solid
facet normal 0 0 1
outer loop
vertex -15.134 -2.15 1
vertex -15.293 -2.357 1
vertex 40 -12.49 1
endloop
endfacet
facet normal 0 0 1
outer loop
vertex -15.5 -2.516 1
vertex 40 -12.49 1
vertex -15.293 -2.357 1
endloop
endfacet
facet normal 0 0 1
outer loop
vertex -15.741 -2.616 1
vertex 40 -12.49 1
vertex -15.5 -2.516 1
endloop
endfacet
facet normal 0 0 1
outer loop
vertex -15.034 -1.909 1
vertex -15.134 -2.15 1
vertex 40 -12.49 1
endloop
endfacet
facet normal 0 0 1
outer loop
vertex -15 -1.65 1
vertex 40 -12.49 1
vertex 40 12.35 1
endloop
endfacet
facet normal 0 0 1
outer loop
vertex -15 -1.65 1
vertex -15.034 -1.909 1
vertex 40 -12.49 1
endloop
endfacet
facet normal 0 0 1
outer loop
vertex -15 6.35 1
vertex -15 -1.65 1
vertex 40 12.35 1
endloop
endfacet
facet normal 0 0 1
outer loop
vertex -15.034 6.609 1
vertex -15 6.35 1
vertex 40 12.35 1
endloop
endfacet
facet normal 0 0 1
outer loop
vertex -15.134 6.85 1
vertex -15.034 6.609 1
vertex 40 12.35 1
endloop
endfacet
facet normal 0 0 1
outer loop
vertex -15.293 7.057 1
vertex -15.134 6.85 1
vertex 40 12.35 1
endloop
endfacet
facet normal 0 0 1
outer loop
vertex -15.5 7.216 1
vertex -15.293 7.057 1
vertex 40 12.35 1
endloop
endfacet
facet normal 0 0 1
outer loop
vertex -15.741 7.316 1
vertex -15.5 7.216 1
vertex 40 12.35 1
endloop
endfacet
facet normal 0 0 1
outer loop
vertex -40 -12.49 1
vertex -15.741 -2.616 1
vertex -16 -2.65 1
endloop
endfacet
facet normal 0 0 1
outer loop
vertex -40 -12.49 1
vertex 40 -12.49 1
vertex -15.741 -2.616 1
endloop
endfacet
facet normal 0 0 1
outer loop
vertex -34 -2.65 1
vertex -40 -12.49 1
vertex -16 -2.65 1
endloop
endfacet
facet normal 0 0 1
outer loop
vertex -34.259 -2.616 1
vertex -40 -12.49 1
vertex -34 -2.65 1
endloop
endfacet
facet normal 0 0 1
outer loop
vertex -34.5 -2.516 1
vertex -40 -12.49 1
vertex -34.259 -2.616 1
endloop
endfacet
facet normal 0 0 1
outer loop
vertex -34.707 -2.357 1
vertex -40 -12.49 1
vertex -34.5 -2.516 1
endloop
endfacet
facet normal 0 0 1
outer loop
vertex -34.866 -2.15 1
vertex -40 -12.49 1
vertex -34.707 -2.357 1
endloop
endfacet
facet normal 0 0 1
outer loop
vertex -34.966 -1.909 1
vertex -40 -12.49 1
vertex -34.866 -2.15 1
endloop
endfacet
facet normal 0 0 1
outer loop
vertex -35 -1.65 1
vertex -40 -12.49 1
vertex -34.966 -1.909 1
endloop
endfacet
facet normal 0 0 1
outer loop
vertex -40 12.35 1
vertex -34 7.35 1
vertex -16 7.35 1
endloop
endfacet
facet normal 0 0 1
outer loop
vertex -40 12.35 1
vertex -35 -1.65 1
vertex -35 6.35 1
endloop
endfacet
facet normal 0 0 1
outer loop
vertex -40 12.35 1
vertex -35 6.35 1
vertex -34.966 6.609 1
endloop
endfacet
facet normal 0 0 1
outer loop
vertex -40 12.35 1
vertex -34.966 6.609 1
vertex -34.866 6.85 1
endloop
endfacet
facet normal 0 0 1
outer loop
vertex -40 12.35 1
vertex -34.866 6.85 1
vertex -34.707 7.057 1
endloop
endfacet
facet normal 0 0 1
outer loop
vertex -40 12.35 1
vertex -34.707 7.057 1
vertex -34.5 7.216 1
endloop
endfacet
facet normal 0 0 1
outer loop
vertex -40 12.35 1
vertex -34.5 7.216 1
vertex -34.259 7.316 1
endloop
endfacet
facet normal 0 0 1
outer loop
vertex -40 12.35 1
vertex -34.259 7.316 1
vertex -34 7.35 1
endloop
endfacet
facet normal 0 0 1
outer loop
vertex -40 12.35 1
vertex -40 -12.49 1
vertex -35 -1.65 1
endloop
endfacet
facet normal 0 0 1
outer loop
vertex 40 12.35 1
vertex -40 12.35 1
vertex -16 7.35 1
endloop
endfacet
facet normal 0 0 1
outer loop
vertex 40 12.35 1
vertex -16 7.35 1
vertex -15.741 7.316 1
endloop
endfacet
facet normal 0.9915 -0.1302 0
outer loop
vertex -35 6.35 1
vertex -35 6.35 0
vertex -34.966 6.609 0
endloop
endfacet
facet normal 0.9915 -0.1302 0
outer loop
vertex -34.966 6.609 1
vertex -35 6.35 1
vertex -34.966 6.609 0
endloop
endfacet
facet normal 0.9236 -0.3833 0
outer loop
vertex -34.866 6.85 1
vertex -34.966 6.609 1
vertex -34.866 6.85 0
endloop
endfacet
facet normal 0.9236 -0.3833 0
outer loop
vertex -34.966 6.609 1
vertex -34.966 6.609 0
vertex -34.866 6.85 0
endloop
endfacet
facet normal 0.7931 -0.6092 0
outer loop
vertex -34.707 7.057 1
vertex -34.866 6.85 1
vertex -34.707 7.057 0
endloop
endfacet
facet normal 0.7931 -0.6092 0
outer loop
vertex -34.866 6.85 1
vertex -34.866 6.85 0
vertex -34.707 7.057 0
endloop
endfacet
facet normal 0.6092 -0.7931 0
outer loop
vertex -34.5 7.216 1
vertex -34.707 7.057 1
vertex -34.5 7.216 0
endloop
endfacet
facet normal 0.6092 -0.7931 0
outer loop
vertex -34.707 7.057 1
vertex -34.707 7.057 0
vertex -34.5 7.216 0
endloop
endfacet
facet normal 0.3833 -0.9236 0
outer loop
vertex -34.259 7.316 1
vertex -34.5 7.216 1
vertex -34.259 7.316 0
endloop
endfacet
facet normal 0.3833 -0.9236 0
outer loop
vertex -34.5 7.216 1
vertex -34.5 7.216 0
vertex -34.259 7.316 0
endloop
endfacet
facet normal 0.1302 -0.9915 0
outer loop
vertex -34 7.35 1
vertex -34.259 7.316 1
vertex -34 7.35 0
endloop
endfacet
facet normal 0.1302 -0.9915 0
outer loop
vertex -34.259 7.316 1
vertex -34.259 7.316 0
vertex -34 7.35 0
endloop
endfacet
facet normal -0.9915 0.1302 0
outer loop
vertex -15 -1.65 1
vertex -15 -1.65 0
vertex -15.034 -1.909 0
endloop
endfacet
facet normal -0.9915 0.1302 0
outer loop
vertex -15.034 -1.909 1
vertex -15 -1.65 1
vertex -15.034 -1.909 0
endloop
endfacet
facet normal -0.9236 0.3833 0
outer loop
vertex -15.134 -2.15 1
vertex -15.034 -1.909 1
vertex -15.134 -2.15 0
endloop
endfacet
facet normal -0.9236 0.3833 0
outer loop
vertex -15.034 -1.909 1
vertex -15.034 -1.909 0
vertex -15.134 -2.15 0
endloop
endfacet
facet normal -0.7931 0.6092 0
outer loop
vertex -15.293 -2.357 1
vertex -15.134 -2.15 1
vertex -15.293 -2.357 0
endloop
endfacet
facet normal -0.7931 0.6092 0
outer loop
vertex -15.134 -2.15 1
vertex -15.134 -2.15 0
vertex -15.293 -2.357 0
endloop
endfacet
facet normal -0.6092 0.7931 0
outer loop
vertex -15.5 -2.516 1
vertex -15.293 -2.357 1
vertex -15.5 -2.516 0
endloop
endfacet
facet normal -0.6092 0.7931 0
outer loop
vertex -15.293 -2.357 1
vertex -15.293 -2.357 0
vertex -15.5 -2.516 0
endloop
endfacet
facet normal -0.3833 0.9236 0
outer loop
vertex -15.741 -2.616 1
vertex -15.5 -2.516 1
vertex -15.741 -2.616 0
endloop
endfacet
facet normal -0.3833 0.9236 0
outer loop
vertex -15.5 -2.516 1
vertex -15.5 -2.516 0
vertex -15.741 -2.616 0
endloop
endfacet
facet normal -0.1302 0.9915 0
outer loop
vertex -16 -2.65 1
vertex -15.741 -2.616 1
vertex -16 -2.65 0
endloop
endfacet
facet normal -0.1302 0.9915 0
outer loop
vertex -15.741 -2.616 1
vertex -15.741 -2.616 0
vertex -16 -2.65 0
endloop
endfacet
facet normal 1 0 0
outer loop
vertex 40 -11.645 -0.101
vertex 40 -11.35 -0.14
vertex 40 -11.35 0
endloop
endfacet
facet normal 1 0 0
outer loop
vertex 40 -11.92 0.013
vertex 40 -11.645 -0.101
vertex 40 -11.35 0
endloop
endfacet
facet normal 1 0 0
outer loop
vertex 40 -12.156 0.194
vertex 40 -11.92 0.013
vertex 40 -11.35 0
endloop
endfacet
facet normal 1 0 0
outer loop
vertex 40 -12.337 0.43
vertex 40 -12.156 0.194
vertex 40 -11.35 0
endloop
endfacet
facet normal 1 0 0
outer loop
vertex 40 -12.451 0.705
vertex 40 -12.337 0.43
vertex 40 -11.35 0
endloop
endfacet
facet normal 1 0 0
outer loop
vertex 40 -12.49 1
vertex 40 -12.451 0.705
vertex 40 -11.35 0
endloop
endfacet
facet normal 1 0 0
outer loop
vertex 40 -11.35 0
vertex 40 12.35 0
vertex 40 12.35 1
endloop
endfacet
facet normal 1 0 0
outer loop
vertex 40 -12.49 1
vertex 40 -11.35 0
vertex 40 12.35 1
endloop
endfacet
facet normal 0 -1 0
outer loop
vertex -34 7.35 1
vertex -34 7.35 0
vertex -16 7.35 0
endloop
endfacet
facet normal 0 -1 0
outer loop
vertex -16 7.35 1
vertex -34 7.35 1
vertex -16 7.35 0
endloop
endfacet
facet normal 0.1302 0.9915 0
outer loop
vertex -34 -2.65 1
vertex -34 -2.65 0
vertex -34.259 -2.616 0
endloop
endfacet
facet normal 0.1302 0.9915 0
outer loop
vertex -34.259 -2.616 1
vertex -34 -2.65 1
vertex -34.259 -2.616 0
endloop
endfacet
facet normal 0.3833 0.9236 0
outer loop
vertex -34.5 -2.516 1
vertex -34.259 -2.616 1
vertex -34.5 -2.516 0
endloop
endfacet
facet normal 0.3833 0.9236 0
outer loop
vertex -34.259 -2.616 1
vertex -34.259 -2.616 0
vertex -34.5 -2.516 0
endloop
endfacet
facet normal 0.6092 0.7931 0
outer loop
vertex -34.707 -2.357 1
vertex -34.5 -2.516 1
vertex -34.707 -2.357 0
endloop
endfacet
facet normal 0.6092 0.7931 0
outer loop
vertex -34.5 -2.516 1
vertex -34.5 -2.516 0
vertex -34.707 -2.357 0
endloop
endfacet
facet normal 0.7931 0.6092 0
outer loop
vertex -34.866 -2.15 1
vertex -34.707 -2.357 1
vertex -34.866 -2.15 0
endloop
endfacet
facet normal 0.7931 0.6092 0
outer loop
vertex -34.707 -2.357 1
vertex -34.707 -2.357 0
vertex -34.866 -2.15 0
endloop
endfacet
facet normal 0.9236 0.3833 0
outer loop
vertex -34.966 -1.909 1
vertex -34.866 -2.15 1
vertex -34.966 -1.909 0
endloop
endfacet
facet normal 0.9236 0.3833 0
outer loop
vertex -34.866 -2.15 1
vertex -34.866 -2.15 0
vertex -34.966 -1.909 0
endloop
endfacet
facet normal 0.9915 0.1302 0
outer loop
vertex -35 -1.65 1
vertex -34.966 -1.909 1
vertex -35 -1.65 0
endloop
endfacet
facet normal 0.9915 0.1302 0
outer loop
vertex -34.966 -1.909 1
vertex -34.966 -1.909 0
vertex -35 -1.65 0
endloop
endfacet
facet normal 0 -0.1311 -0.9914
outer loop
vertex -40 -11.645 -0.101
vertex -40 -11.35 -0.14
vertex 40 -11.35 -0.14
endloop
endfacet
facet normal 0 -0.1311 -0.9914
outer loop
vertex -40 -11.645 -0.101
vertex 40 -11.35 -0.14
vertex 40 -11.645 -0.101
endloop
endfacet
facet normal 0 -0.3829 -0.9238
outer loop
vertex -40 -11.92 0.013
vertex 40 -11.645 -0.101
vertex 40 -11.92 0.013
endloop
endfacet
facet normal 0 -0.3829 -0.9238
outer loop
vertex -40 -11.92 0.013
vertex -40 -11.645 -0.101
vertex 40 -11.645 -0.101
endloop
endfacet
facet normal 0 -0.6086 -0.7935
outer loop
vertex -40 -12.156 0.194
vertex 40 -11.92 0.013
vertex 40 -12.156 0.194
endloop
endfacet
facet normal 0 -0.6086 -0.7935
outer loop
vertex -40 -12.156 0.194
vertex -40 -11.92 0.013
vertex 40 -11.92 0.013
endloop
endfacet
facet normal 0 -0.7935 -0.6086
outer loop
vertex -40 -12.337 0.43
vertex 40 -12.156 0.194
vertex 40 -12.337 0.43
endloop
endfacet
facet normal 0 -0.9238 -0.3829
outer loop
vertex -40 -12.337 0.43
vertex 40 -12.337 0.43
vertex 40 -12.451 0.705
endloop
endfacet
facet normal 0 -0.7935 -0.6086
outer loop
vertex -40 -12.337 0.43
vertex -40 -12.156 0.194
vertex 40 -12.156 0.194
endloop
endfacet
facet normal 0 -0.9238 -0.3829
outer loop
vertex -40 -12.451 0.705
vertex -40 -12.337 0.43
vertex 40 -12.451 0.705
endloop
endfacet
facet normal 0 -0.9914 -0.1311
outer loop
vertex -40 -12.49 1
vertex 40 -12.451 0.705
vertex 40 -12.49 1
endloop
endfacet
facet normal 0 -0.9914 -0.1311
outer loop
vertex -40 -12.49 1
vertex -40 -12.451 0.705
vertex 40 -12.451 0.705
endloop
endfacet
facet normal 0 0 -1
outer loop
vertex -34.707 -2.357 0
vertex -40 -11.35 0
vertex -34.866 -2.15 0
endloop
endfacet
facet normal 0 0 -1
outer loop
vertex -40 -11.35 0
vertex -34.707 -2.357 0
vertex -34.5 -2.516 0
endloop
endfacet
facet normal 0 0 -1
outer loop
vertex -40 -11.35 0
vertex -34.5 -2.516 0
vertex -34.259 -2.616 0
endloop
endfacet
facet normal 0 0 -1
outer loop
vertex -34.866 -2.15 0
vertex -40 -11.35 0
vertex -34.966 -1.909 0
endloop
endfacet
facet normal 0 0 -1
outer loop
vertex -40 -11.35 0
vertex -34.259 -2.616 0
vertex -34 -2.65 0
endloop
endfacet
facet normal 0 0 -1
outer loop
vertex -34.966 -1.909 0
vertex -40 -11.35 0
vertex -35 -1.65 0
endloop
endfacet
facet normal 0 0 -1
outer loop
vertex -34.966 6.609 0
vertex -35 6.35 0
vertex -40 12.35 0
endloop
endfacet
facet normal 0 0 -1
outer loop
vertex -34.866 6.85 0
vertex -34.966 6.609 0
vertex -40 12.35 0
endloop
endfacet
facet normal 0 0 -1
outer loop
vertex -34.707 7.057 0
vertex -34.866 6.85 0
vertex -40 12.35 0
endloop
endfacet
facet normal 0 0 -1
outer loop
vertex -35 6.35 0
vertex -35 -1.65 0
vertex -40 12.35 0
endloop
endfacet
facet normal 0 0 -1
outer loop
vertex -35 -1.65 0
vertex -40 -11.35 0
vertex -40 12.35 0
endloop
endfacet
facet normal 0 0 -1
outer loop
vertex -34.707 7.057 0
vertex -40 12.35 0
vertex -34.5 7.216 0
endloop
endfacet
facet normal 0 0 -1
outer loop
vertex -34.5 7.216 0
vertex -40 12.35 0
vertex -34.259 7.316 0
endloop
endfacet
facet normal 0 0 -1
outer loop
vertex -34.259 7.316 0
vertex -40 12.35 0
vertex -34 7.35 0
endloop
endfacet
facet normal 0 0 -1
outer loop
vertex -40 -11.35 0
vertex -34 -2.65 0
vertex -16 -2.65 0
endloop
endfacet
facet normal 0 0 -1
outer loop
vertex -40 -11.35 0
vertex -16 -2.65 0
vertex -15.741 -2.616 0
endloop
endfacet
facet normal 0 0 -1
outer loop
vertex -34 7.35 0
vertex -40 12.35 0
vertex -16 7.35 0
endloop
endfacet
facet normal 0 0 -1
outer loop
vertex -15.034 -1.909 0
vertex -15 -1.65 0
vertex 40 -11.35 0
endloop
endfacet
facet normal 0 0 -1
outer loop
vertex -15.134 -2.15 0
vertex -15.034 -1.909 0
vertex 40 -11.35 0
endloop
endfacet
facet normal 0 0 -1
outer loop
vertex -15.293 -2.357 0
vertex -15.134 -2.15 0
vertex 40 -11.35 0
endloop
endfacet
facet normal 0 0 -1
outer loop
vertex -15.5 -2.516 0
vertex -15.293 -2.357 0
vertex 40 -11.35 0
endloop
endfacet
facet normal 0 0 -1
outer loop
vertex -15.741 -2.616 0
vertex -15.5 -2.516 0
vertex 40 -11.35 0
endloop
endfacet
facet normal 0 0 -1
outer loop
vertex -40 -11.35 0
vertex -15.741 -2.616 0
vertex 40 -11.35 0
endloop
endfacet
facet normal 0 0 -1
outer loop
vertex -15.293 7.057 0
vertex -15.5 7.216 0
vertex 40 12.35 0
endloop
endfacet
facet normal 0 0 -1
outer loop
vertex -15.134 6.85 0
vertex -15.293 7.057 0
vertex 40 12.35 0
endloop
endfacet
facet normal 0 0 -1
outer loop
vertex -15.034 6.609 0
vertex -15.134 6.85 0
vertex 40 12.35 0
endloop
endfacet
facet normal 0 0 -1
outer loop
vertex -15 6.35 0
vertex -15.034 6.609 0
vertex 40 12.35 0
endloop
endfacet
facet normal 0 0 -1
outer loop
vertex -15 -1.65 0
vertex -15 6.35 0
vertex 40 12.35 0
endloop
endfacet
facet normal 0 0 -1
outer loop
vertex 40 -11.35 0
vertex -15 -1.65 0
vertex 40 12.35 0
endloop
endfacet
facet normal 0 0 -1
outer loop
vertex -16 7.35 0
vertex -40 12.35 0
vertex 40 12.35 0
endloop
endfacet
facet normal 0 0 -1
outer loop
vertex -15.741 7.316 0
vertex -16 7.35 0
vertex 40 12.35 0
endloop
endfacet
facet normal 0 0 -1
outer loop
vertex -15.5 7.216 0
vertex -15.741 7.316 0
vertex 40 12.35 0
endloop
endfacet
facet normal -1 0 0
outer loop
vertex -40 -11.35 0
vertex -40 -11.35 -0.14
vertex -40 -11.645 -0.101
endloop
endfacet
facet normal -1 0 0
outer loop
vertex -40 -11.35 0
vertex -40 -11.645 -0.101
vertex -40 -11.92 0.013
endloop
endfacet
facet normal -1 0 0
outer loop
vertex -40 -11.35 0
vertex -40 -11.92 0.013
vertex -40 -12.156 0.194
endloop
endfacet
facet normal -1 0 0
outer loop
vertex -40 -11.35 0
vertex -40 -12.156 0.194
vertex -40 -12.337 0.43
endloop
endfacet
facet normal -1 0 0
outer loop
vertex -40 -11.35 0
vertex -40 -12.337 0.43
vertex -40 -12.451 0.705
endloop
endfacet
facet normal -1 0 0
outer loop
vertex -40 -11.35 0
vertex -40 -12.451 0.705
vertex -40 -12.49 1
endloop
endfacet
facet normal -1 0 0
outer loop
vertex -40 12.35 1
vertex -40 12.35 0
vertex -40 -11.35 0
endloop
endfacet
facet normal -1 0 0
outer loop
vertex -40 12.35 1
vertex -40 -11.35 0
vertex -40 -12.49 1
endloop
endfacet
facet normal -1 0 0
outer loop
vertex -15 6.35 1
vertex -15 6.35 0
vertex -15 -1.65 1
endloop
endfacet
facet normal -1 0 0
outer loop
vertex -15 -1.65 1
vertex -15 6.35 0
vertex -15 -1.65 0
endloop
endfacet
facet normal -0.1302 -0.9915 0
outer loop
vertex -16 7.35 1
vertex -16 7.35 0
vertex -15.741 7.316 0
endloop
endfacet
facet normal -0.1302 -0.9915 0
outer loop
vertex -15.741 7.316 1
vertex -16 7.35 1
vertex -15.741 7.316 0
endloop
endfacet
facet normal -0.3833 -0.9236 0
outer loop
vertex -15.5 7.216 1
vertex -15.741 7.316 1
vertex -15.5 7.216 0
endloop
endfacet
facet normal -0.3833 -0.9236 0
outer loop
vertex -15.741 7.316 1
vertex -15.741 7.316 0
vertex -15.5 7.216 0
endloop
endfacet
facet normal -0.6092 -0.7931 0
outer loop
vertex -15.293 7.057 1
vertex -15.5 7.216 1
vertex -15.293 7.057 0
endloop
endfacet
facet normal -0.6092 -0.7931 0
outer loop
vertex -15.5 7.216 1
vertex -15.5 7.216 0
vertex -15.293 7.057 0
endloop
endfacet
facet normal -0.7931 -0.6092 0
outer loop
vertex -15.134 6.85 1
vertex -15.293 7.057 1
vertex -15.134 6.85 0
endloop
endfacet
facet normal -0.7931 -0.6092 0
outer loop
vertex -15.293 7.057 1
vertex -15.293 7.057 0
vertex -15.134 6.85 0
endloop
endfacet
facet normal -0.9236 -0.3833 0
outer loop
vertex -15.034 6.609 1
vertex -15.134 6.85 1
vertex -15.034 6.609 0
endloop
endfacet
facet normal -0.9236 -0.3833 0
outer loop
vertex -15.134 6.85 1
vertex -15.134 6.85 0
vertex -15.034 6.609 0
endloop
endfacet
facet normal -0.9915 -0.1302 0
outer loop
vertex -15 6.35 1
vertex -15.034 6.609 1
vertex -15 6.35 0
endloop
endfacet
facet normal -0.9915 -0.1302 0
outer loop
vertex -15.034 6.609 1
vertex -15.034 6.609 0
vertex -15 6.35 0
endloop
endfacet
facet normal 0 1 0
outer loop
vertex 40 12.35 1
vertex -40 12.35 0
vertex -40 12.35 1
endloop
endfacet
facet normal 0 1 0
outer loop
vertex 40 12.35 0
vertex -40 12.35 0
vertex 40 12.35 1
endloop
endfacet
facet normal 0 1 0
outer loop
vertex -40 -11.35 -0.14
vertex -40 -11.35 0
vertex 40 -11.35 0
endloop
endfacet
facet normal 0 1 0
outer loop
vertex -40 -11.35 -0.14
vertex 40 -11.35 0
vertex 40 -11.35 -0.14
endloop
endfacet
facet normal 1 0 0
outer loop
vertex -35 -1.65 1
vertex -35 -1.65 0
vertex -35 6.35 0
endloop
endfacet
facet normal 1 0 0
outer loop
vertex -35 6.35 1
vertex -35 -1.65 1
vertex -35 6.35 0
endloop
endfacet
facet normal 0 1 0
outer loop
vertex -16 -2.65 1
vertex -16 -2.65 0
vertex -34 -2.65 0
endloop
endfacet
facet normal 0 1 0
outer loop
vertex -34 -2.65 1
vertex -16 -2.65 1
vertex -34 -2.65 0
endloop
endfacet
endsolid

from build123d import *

# Parameters (mm, degrees)
SKETCH1_W           = 80
SKETCH1_H           = 24.7
BOSS_EXTRUDE1_DEPTH = 1
CUT_EXTRUDE1_DEPTH  = 100
CUT_EXTRUDE2_DEPTH  = 1
BOSS_EXTRUDE2_START = -80
BOSS_EXTRUDE2_DEPTH = 80


with BuildPart() as part:
    # Sketch1 → Boss-Extrude1 (new body)
    with BuildSketch(Plane.XY):
        Rectangle(SKETCH1_W, SKETCH1_H)
    extrude(amount=BOSS_EXTRUDE1_DEPTH)

    # Sketch2 → Cut-Extrude1 (cut)
    with BuildSketch(Plane.ZY.offset(40)):
        with BuildLine():
            Line((0, -12.35), (1, -12.35))
            ThreePointArc((1, -12.35), (0.292893219, -12.057106781), (0, -11.35))
            Line((0, -11.35), (0, -12.35))
        make_face()
    extrude(amount=-CUT_EXTRUDE1_DEPTH, mode=Mode.SUBTRACT)

    # Sketch3 → Cut-Extrude2 (cut)
    with BuildSketch(Plane(origin=(0, 0, 0), x_dir=(-1, 0, 0), z_dir=(0, 0, -1))):
        with BuildLine():
            Line((34, 7.35), (16, 7.35))
            ThreePointArc((16, 7.35), (15.292893219, 7.057106781), (15, 6.35))
            Line((15, 6.35), (15, -1.65))
            ThreePointArc((15, -1.65), (15.292893219, -2.357106781), (16, -2.65))
            Line((16, -2.65), (34, -2.65))
            ThreePointArc((34, -2.65), (34.707106781, -2.357106781), (35, -1.65))
            Line((35, -1.65), (35, 6.35))
            ThreePointArc((35, 6.35), (34.707106781, 7.057106781), (34, 7.35))
        make_face()
    extrude(amount=-CUT_EXTRUDE2_DEPTH, mode=Mode.SUBTRACT)

    # Sketch4 → Boss-Extrude2 (add)
    with BuildSketch(Plane(origin=(40, 0, 0), x_dir=(0, 0, -1), z_dir=(1, 0, 0)).offset(BOSS_EXTRUDE2_START)):
        with BuildLine():
            Line((-1, -12.49), (-1, -12.35))
            ThreePointArc((-1, -12.35), (-0.292893219, -12.057106781), (0, -11.35))
            Line((0, -11.35), (0.14, -11.35))
            ThreePointArc((0.14, -11.35), (-0.193898269, -12.156101731), (-1, -12.49))
        make_face()
    extrude(amount=BOSS_EXTRUDE2_DEPTH)


solid = part.part
